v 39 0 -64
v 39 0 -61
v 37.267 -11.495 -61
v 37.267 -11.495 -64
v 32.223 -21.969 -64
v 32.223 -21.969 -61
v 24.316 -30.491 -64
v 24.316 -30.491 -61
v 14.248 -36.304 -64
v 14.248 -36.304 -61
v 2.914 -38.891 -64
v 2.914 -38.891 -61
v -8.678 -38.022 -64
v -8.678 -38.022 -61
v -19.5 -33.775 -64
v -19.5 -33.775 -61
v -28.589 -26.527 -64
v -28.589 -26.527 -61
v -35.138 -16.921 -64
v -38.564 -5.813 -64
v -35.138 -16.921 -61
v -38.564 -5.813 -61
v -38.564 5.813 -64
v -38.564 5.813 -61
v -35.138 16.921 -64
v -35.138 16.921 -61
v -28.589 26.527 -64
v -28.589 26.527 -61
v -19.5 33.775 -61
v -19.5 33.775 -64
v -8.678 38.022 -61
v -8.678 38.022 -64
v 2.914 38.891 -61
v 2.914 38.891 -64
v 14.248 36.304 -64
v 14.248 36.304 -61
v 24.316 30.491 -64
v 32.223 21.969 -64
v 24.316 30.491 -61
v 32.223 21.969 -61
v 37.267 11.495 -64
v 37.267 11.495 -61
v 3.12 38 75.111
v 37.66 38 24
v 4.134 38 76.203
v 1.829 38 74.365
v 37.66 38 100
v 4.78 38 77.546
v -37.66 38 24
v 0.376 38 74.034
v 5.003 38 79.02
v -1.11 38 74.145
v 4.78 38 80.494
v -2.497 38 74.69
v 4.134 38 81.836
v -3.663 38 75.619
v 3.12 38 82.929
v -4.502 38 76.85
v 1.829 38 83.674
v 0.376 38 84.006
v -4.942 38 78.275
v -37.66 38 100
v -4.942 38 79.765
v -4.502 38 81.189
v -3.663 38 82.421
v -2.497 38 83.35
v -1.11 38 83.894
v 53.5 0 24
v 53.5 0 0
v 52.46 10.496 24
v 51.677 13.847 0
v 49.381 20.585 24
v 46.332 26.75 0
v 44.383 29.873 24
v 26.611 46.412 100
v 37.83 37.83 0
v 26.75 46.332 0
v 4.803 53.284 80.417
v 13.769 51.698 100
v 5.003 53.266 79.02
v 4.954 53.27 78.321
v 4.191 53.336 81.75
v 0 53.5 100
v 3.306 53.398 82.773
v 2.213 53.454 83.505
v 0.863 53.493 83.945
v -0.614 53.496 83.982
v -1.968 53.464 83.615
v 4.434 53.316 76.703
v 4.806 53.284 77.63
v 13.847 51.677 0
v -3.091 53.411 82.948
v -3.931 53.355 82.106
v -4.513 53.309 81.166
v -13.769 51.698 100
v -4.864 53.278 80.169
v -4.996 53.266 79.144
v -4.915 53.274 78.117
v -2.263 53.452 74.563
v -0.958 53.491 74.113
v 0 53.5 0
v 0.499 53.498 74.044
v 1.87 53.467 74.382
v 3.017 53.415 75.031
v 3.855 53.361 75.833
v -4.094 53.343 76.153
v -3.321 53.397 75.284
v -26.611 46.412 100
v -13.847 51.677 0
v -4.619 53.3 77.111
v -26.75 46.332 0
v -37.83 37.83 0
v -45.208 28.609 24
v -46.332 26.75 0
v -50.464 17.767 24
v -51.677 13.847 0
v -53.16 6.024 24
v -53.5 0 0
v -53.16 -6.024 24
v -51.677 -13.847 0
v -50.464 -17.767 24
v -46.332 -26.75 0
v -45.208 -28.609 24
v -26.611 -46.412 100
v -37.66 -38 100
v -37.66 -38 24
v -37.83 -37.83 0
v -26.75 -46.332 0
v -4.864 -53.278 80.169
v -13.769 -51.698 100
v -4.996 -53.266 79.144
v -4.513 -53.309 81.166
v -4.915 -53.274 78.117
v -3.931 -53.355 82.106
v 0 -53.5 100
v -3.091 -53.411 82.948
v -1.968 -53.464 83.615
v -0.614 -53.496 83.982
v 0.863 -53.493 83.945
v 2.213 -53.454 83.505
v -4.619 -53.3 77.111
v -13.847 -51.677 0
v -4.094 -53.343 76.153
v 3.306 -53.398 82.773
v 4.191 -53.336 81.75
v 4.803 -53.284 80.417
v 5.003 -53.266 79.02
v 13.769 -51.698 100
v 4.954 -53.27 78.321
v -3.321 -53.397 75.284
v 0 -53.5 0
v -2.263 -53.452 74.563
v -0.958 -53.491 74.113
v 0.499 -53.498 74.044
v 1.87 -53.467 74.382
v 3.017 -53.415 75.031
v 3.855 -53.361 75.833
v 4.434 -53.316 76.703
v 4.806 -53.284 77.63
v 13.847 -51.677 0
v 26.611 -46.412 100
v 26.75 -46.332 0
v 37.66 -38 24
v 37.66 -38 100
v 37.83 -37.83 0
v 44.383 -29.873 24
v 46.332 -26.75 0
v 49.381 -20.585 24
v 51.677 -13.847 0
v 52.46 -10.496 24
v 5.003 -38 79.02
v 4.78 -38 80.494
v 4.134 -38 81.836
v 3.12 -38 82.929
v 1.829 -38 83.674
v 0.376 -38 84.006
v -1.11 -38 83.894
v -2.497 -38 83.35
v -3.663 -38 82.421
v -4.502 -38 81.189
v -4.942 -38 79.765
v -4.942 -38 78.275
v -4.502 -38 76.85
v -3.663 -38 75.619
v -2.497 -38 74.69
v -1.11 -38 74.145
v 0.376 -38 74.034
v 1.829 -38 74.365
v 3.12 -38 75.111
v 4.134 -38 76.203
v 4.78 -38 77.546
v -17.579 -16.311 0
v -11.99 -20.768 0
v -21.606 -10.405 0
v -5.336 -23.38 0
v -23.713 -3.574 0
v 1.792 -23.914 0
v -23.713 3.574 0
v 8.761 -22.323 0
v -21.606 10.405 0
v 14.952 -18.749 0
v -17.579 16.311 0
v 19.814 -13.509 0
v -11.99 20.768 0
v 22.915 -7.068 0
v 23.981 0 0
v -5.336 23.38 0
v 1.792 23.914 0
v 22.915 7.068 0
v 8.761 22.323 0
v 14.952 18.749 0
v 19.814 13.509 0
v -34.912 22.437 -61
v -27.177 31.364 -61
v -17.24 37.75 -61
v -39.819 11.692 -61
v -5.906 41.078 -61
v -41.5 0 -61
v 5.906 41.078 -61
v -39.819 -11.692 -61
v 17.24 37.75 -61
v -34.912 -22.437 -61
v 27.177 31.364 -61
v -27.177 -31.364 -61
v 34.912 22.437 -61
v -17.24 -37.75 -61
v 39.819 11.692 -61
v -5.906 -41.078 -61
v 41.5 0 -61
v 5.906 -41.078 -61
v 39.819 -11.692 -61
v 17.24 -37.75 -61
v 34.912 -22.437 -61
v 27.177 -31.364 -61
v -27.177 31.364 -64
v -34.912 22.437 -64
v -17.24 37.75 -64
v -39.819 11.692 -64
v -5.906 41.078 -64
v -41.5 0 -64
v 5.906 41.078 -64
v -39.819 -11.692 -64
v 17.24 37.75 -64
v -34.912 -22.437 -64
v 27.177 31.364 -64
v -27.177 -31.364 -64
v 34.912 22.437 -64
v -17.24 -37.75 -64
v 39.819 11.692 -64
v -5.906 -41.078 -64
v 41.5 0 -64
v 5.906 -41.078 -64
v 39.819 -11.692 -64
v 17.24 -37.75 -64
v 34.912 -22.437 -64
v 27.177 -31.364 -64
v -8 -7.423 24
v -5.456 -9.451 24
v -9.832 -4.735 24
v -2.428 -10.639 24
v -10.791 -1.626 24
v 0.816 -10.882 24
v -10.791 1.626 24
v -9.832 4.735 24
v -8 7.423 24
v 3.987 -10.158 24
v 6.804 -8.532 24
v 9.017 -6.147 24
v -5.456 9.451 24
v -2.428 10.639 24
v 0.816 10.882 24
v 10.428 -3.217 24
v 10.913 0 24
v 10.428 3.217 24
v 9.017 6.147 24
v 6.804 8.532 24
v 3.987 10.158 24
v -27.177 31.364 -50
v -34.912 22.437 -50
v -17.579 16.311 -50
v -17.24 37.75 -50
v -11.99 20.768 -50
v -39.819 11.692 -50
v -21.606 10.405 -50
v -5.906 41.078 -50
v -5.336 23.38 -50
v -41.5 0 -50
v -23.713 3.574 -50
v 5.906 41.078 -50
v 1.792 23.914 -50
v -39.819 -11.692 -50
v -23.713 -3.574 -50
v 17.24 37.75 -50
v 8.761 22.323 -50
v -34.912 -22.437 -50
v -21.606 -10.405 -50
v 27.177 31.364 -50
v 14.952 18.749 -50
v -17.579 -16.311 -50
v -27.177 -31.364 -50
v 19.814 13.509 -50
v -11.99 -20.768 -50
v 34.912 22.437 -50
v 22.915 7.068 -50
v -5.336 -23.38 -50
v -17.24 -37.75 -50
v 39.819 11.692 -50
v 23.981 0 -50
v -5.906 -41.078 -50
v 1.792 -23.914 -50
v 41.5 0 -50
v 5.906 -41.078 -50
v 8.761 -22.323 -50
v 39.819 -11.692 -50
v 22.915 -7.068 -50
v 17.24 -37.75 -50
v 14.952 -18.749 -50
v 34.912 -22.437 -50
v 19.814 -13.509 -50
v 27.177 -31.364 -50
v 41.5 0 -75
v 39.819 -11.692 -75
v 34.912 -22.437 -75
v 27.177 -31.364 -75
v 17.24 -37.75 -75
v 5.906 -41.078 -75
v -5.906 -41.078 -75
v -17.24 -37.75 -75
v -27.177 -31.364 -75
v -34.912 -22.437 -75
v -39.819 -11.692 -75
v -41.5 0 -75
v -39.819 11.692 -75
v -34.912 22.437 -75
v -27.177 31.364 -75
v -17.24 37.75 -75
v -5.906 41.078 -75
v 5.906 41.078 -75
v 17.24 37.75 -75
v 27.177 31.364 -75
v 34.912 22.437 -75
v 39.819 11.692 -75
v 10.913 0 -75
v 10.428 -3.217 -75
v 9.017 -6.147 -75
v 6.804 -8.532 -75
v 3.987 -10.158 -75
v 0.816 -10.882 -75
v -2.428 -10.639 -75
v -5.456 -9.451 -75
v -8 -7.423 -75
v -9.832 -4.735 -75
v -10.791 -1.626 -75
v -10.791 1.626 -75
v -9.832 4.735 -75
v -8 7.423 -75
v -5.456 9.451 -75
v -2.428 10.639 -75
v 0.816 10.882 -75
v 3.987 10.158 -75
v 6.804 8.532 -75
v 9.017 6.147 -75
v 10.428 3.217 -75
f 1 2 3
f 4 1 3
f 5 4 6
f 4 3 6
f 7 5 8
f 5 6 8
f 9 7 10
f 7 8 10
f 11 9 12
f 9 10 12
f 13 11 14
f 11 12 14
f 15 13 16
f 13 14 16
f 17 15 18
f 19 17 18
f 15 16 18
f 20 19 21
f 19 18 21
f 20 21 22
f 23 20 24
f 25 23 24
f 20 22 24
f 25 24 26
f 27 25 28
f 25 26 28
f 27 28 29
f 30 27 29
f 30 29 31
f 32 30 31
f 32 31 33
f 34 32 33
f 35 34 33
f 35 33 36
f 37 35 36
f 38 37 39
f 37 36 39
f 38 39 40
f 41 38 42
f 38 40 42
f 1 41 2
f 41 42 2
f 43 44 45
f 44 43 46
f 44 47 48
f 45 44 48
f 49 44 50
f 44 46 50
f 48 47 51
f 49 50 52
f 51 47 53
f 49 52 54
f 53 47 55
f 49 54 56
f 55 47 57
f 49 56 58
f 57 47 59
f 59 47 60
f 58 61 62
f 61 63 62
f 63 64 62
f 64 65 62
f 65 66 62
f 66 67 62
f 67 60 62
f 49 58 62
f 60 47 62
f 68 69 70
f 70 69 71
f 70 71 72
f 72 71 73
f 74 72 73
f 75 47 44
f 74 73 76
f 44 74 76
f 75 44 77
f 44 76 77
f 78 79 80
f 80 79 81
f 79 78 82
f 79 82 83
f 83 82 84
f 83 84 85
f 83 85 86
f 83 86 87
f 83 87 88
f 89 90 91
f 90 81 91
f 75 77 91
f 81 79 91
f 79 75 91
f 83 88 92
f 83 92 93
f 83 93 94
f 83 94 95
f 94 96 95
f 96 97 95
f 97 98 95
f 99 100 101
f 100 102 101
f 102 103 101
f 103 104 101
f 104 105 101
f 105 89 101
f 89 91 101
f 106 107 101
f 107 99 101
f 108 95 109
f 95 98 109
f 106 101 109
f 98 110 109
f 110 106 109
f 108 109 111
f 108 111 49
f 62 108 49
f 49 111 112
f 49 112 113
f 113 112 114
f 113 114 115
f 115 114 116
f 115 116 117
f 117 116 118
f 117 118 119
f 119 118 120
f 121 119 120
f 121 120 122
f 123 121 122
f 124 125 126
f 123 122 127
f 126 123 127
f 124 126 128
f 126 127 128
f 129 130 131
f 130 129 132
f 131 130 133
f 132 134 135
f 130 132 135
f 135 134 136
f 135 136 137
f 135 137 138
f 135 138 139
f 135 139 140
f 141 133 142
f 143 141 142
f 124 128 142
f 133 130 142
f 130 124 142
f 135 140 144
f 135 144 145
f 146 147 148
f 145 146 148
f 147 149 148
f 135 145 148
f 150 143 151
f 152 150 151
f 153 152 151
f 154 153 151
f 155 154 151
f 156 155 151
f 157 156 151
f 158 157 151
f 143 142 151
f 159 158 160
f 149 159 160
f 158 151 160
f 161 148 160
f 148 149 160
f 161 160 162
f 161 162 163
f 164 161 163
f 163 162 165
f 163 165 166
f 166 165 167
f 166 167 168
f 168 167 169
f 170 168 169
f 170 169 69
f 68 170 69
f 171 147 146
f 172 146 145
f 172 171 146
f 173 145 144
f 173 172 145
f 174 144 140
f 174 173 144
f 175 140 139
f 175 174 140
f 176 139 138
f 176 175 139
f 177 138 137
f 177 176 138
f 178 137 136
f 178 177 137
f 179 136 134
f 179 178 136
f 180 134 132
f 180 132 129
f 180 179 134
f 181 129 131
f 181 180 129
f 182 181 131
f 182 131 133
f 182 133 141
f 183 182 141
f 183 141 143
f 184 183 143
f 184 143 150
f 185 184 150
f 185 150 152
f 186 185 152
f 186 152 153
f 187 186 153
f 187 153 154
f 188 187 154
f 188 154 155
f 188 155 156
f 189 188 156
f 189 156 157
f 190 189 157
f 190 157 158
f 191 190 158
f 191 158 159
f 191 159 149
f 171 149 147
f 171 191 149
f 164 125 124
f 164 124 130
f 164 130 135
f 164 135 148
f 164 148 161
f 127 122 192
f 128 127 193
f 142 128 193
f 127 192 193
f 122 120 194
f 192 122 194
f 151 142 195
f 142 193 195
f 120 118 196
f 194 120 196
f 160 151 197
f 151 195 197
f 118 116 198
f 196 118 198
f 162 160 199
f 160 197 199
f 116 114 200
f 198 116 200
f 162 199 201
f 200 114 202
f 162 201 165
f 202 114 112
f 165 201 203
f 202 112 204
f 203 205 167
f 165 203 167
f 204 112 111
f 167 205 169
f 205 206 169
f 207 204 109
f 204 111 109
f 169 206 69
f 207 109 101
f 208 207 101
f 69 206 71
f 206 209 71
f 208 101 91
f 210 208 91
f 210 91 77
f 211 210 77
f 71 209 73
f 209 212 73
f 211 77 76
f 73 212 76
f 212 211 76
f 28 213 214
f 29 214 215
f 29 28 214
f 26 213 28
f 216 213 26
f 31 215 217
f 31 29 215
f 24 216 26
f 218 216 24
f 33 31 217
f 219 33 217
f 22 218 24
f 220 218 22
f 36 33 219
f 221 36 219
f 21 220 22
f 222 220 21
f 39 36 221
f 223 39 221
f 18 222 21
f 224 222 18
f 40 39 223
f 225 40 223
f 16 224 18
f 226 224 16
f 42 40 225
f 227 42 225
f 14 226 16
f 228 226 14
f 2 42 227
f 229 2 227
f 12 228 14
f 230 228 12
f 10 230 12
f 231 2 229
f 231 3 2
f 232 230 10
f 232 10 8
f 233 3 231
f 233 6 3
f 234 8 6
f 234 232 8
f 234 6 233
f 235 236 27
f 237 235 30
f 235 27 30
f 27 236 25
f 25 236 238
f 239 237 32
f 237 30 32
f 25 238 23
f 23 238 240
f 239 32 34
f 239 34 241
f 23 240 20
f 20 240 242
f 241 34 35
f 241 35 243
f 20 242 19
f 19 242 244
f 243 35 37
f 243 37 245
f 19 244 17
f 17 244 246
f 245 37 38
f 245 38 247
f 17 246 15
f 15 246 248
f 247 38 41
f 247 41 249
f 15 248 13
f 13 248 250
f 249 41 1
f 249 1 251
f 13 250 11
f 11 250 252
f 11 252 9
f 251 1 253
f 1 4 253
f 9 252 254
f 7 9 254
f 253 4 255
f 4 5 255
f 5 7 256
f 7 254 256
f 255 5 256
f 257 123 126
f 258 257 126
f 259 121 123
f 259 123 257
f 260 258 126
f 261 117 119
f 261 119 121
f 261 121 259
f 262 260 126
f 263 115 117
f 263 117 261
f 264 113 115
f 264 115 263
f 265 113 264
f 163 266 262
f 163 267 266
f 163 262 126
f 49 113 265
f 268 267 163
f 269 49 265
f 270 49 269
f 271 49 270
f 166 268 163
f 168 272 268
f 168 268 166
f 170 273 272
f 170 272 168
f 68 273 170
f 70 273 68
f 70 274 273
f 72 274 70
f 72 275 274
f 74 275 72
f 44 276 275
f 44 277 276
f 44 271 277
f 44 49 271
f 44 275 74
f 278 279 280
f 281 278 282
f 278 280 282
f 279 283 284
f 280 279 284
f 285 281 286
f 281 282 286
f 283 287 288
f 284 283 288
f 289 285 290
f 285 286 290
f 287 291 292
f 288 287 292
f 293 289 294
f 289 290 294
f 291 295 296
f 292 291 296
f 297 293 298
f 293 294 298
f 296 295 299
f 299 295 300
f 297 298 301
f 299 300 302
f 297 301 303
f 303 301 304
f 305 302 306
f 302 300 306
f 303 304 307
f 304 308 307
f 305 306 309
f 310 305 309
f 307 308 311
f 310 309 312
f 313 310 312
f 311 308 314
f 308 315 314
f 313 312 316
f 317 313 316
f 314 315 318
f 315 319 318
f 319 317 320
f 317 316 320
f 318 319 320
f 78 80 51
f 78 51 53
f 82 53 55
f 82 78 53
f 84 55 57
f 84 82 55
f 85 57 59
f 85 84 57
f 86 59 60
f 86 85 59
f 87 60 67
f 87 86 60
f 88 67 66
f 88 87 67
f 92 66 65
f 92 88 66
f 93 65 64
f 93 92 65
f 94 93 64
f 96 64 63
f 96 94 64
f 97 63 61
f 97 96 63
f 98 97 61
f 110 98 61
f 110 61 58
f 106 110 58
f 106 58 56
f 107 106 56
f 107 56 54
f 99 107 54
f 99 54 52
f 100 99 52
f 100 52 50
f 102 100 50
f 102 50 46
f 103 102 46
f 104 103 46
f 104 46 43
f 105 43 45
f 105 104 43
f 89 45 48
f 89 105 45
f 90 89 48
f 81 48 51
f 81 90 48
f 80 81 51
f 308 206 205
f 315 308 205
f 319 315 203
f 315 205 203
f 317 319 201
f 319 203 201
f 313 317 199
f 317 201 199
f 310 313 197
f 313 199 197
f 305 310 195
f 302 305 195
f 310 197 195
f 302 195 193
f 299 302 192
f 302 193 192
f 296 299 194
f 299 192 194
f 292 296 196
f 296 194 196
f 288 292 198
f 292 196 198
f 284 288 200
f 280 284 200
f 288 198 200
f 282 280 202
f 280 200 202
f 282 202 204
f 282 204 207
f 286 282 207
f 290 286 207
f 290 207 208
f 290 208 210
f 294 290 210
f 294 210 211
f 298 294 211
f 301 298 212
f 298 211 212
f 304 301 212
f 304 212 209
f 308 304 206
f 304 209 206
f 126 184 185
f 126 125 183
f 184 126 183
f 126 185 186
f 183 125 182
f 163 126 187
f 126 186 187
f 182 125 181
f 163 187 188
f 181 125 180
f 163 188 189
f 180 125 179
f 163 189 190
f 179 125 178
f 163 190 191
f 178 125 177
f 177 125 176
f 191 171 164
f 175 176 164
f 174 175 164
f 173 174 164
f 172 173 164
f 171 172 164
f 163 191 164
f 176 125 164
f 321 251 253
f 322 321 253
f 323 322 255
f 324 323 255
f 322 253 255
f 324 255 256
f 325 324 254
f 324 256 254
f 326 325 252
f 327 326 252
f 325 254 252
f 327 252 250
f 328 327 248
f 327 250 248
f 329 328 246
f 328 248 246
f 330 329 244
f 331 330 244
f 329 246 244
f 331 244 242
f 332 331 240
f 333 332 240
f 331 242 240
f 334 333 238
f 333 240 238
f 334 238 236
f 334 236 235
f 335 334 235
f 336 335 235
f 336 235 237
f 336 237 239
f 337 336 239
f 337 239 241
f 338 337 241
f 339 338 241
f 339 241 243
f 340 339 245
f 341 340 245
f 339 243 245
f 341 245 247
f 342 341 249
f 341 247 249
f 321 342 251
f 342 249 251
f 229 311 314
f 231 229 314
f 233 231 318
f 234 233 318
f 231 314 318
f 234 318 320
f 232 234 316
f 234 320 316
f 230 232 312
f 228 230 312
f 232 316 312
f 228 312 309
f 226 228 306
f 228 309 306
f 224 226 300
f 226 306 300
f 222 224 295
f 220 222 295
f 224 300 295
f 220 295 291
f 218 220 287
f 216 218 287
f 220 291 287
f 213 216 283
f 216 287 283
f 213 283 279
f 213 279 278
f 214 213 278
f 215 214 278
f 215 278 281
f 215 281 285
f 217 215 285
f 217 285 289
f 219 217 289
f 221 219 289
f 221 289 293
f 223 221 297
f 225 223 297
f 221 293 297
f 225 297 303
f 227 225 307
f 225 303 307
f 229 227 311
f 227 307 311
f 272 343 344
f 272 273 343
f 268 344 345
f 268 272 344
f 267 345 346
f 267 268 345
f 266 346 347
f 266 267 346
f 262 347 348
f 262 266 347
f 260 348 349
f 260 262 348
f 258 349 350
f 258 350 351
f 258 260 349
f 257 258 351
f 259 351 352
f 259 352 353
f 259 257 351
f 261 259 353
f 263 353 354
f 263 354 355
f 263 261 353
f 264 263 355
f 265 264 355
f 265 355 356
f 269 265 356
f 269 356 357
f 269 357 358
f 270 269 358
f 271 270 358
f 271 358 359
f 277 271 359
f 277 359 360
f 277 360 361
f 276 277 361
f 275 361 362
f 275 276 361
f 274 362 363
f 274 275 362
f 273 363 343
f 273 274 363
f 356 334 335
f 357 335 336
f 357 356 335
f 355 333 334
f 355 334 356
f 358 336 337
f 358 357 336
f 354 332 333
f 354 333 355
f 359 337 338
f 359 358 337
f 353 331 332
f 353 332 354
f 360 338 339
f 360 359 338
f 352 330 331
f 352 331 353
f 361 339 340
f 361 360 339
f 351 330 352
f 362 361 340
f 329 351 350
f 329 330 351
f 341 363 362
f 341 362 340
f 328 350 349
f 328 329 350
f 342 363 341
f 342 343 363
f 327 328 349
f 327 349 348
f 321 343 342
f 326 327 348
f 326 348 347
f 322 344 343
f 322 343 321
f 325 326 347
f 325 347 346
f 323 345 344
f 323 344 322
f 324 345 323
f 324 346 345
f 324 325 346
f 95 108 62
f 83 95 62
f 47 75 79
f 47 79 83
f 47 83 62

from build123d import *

# Parameters (mm, degrees)
F0_R      = 53.5
F0_R_2    = 10.9127793542
F1_DEPTH  = 100
F2_R      = 10.9127793542
F3_DEPTH  = 76
F5_R      = 23.9808815671
F5_R_2    = 10.9127793542
F6_DEPTH  = 50
F7_R      = 41.5
F7_R_2    = 23.9808815671
F7_R_3    = 10.9127793542
F8_DEPTH  = 11
F9_R      = 39
F9_R_2    = 10.9127793542
F10_DEPTH = 3
F11_R     = 41.5
F11_R_2   = 39
F11_R_3   = 10.9127793542
F12_DEPTH = 11
F13_R     = 5
F14_DEPTH = 125


# Not quite as in the source:
# - a feature names something its author has since deleted; it is built from what else it names


with BuildPart() as f1:
    # F0 (on Top) → F1 (new body)
    with BuildSketch(Plane.XY):
        Circle(F0_R)
        Circle(F0_R_2, mode=Mode.SUBTRACT)
    extrude(amount=F1_DEPTH)


with BuildPart() as f3:
    # F2 (on face) → F3 (new body)
    with BuildSketch(Plane.XY.offset(100)):
        with BuildLine():
            ThreePointArc((53.5, 0), (49.381382201, 20.5846810011), (37.6596601153, 38))
            Line((37.6596601153, 38), (-37.6596601153, 38))
            ThreePointArc((-37.6596601153, 38), (-53.5, 0), (-37.6596601153, -38))
            Line((-37.6596601153, -38), (37.6596601153, -38))
            ThreePointArc((37.6596601153, -38), (49.381382201, -20.5846810011), (53.5, 0))
        make_face()
        Circle(F2_R, mode=Mode.SUBTRACT)
    extrude(amount=-F3_DEPTH)


with BuildPart() as f1_1:
    add(f1.part)

    # F4: cut F3
    add(f3.part, mode=Mode.SUBTRACT)

    # F5 (on face) → F6 (join)
    with BuildSketch(Plane(origin=(0, 0, 0), x_dir=(1, 0, 0), z_dir=(0, 0, -1))):
        Circle(F5_R)
        Circle(F5_R_2, mode=Mode.SUBTRACT)
    extrude(amount=F6_DEPTH)

    # F7 (on face) → F8 (join)
    with BuildSketch(Plane(origin=(0, 0, -50), x_dir=(1, 0, 0), z_dir=(0, 0, -1))):
        Circle(F7_R)
        Circle(F7_R_2, mode=Mode.SUBTRACT)
        Circle(F7_R_2)
        Circle(F7_R_3, mode=Mode.SUBTRACT)
    extrude(amount=F8_DEPTH)

    # F9 (on face) → F10 (join)
    with BuildSketch(Plane(origin=(0, 0, -61), x_dir=(1, 0, 0), z_dir=(0, 0, -1))):
        Circle(F9_R)
        Circle(F9_R_2, mode=Mode.SUBTRACT)
    extrude(amount=F10_DEPTH)

    # F11 (on face) → F12 (join)
    with BuildSketch(Plane(origin=(0, 0, -64), x_dir=(1, 0, 0), z_dir=(0, 0, -1))):
        Circle(F11_R)
        Circle(F11_R_2, mode=Mode.SUBTRACT)
        Circle(F11_R_2)
        Circle(F11_R_3, mode=Mode.SUBTRACT)
    extrude(amount=F12_DEPTH)


with BuildPart() as f14:
    # F13 (on Front) → F14 (new body)
    with BuildSketch(Plane.XZ):
        with Locations((-63.11737746, -22.980183363)):
            Circle(F13_R)
    extrude(amount=F14_DEPTH)


with BuildPart() as f14_1:
    # F15: moved
    add(f14.part.moved(Location((63.12, 62.74391, 102))))


with BuildPart() as f1_2:
    add(f1_1.part)

    # F16: cut F14
    add(f14_1.part, mode=Mode.SUBTRACT)


solid = f1_2.part
